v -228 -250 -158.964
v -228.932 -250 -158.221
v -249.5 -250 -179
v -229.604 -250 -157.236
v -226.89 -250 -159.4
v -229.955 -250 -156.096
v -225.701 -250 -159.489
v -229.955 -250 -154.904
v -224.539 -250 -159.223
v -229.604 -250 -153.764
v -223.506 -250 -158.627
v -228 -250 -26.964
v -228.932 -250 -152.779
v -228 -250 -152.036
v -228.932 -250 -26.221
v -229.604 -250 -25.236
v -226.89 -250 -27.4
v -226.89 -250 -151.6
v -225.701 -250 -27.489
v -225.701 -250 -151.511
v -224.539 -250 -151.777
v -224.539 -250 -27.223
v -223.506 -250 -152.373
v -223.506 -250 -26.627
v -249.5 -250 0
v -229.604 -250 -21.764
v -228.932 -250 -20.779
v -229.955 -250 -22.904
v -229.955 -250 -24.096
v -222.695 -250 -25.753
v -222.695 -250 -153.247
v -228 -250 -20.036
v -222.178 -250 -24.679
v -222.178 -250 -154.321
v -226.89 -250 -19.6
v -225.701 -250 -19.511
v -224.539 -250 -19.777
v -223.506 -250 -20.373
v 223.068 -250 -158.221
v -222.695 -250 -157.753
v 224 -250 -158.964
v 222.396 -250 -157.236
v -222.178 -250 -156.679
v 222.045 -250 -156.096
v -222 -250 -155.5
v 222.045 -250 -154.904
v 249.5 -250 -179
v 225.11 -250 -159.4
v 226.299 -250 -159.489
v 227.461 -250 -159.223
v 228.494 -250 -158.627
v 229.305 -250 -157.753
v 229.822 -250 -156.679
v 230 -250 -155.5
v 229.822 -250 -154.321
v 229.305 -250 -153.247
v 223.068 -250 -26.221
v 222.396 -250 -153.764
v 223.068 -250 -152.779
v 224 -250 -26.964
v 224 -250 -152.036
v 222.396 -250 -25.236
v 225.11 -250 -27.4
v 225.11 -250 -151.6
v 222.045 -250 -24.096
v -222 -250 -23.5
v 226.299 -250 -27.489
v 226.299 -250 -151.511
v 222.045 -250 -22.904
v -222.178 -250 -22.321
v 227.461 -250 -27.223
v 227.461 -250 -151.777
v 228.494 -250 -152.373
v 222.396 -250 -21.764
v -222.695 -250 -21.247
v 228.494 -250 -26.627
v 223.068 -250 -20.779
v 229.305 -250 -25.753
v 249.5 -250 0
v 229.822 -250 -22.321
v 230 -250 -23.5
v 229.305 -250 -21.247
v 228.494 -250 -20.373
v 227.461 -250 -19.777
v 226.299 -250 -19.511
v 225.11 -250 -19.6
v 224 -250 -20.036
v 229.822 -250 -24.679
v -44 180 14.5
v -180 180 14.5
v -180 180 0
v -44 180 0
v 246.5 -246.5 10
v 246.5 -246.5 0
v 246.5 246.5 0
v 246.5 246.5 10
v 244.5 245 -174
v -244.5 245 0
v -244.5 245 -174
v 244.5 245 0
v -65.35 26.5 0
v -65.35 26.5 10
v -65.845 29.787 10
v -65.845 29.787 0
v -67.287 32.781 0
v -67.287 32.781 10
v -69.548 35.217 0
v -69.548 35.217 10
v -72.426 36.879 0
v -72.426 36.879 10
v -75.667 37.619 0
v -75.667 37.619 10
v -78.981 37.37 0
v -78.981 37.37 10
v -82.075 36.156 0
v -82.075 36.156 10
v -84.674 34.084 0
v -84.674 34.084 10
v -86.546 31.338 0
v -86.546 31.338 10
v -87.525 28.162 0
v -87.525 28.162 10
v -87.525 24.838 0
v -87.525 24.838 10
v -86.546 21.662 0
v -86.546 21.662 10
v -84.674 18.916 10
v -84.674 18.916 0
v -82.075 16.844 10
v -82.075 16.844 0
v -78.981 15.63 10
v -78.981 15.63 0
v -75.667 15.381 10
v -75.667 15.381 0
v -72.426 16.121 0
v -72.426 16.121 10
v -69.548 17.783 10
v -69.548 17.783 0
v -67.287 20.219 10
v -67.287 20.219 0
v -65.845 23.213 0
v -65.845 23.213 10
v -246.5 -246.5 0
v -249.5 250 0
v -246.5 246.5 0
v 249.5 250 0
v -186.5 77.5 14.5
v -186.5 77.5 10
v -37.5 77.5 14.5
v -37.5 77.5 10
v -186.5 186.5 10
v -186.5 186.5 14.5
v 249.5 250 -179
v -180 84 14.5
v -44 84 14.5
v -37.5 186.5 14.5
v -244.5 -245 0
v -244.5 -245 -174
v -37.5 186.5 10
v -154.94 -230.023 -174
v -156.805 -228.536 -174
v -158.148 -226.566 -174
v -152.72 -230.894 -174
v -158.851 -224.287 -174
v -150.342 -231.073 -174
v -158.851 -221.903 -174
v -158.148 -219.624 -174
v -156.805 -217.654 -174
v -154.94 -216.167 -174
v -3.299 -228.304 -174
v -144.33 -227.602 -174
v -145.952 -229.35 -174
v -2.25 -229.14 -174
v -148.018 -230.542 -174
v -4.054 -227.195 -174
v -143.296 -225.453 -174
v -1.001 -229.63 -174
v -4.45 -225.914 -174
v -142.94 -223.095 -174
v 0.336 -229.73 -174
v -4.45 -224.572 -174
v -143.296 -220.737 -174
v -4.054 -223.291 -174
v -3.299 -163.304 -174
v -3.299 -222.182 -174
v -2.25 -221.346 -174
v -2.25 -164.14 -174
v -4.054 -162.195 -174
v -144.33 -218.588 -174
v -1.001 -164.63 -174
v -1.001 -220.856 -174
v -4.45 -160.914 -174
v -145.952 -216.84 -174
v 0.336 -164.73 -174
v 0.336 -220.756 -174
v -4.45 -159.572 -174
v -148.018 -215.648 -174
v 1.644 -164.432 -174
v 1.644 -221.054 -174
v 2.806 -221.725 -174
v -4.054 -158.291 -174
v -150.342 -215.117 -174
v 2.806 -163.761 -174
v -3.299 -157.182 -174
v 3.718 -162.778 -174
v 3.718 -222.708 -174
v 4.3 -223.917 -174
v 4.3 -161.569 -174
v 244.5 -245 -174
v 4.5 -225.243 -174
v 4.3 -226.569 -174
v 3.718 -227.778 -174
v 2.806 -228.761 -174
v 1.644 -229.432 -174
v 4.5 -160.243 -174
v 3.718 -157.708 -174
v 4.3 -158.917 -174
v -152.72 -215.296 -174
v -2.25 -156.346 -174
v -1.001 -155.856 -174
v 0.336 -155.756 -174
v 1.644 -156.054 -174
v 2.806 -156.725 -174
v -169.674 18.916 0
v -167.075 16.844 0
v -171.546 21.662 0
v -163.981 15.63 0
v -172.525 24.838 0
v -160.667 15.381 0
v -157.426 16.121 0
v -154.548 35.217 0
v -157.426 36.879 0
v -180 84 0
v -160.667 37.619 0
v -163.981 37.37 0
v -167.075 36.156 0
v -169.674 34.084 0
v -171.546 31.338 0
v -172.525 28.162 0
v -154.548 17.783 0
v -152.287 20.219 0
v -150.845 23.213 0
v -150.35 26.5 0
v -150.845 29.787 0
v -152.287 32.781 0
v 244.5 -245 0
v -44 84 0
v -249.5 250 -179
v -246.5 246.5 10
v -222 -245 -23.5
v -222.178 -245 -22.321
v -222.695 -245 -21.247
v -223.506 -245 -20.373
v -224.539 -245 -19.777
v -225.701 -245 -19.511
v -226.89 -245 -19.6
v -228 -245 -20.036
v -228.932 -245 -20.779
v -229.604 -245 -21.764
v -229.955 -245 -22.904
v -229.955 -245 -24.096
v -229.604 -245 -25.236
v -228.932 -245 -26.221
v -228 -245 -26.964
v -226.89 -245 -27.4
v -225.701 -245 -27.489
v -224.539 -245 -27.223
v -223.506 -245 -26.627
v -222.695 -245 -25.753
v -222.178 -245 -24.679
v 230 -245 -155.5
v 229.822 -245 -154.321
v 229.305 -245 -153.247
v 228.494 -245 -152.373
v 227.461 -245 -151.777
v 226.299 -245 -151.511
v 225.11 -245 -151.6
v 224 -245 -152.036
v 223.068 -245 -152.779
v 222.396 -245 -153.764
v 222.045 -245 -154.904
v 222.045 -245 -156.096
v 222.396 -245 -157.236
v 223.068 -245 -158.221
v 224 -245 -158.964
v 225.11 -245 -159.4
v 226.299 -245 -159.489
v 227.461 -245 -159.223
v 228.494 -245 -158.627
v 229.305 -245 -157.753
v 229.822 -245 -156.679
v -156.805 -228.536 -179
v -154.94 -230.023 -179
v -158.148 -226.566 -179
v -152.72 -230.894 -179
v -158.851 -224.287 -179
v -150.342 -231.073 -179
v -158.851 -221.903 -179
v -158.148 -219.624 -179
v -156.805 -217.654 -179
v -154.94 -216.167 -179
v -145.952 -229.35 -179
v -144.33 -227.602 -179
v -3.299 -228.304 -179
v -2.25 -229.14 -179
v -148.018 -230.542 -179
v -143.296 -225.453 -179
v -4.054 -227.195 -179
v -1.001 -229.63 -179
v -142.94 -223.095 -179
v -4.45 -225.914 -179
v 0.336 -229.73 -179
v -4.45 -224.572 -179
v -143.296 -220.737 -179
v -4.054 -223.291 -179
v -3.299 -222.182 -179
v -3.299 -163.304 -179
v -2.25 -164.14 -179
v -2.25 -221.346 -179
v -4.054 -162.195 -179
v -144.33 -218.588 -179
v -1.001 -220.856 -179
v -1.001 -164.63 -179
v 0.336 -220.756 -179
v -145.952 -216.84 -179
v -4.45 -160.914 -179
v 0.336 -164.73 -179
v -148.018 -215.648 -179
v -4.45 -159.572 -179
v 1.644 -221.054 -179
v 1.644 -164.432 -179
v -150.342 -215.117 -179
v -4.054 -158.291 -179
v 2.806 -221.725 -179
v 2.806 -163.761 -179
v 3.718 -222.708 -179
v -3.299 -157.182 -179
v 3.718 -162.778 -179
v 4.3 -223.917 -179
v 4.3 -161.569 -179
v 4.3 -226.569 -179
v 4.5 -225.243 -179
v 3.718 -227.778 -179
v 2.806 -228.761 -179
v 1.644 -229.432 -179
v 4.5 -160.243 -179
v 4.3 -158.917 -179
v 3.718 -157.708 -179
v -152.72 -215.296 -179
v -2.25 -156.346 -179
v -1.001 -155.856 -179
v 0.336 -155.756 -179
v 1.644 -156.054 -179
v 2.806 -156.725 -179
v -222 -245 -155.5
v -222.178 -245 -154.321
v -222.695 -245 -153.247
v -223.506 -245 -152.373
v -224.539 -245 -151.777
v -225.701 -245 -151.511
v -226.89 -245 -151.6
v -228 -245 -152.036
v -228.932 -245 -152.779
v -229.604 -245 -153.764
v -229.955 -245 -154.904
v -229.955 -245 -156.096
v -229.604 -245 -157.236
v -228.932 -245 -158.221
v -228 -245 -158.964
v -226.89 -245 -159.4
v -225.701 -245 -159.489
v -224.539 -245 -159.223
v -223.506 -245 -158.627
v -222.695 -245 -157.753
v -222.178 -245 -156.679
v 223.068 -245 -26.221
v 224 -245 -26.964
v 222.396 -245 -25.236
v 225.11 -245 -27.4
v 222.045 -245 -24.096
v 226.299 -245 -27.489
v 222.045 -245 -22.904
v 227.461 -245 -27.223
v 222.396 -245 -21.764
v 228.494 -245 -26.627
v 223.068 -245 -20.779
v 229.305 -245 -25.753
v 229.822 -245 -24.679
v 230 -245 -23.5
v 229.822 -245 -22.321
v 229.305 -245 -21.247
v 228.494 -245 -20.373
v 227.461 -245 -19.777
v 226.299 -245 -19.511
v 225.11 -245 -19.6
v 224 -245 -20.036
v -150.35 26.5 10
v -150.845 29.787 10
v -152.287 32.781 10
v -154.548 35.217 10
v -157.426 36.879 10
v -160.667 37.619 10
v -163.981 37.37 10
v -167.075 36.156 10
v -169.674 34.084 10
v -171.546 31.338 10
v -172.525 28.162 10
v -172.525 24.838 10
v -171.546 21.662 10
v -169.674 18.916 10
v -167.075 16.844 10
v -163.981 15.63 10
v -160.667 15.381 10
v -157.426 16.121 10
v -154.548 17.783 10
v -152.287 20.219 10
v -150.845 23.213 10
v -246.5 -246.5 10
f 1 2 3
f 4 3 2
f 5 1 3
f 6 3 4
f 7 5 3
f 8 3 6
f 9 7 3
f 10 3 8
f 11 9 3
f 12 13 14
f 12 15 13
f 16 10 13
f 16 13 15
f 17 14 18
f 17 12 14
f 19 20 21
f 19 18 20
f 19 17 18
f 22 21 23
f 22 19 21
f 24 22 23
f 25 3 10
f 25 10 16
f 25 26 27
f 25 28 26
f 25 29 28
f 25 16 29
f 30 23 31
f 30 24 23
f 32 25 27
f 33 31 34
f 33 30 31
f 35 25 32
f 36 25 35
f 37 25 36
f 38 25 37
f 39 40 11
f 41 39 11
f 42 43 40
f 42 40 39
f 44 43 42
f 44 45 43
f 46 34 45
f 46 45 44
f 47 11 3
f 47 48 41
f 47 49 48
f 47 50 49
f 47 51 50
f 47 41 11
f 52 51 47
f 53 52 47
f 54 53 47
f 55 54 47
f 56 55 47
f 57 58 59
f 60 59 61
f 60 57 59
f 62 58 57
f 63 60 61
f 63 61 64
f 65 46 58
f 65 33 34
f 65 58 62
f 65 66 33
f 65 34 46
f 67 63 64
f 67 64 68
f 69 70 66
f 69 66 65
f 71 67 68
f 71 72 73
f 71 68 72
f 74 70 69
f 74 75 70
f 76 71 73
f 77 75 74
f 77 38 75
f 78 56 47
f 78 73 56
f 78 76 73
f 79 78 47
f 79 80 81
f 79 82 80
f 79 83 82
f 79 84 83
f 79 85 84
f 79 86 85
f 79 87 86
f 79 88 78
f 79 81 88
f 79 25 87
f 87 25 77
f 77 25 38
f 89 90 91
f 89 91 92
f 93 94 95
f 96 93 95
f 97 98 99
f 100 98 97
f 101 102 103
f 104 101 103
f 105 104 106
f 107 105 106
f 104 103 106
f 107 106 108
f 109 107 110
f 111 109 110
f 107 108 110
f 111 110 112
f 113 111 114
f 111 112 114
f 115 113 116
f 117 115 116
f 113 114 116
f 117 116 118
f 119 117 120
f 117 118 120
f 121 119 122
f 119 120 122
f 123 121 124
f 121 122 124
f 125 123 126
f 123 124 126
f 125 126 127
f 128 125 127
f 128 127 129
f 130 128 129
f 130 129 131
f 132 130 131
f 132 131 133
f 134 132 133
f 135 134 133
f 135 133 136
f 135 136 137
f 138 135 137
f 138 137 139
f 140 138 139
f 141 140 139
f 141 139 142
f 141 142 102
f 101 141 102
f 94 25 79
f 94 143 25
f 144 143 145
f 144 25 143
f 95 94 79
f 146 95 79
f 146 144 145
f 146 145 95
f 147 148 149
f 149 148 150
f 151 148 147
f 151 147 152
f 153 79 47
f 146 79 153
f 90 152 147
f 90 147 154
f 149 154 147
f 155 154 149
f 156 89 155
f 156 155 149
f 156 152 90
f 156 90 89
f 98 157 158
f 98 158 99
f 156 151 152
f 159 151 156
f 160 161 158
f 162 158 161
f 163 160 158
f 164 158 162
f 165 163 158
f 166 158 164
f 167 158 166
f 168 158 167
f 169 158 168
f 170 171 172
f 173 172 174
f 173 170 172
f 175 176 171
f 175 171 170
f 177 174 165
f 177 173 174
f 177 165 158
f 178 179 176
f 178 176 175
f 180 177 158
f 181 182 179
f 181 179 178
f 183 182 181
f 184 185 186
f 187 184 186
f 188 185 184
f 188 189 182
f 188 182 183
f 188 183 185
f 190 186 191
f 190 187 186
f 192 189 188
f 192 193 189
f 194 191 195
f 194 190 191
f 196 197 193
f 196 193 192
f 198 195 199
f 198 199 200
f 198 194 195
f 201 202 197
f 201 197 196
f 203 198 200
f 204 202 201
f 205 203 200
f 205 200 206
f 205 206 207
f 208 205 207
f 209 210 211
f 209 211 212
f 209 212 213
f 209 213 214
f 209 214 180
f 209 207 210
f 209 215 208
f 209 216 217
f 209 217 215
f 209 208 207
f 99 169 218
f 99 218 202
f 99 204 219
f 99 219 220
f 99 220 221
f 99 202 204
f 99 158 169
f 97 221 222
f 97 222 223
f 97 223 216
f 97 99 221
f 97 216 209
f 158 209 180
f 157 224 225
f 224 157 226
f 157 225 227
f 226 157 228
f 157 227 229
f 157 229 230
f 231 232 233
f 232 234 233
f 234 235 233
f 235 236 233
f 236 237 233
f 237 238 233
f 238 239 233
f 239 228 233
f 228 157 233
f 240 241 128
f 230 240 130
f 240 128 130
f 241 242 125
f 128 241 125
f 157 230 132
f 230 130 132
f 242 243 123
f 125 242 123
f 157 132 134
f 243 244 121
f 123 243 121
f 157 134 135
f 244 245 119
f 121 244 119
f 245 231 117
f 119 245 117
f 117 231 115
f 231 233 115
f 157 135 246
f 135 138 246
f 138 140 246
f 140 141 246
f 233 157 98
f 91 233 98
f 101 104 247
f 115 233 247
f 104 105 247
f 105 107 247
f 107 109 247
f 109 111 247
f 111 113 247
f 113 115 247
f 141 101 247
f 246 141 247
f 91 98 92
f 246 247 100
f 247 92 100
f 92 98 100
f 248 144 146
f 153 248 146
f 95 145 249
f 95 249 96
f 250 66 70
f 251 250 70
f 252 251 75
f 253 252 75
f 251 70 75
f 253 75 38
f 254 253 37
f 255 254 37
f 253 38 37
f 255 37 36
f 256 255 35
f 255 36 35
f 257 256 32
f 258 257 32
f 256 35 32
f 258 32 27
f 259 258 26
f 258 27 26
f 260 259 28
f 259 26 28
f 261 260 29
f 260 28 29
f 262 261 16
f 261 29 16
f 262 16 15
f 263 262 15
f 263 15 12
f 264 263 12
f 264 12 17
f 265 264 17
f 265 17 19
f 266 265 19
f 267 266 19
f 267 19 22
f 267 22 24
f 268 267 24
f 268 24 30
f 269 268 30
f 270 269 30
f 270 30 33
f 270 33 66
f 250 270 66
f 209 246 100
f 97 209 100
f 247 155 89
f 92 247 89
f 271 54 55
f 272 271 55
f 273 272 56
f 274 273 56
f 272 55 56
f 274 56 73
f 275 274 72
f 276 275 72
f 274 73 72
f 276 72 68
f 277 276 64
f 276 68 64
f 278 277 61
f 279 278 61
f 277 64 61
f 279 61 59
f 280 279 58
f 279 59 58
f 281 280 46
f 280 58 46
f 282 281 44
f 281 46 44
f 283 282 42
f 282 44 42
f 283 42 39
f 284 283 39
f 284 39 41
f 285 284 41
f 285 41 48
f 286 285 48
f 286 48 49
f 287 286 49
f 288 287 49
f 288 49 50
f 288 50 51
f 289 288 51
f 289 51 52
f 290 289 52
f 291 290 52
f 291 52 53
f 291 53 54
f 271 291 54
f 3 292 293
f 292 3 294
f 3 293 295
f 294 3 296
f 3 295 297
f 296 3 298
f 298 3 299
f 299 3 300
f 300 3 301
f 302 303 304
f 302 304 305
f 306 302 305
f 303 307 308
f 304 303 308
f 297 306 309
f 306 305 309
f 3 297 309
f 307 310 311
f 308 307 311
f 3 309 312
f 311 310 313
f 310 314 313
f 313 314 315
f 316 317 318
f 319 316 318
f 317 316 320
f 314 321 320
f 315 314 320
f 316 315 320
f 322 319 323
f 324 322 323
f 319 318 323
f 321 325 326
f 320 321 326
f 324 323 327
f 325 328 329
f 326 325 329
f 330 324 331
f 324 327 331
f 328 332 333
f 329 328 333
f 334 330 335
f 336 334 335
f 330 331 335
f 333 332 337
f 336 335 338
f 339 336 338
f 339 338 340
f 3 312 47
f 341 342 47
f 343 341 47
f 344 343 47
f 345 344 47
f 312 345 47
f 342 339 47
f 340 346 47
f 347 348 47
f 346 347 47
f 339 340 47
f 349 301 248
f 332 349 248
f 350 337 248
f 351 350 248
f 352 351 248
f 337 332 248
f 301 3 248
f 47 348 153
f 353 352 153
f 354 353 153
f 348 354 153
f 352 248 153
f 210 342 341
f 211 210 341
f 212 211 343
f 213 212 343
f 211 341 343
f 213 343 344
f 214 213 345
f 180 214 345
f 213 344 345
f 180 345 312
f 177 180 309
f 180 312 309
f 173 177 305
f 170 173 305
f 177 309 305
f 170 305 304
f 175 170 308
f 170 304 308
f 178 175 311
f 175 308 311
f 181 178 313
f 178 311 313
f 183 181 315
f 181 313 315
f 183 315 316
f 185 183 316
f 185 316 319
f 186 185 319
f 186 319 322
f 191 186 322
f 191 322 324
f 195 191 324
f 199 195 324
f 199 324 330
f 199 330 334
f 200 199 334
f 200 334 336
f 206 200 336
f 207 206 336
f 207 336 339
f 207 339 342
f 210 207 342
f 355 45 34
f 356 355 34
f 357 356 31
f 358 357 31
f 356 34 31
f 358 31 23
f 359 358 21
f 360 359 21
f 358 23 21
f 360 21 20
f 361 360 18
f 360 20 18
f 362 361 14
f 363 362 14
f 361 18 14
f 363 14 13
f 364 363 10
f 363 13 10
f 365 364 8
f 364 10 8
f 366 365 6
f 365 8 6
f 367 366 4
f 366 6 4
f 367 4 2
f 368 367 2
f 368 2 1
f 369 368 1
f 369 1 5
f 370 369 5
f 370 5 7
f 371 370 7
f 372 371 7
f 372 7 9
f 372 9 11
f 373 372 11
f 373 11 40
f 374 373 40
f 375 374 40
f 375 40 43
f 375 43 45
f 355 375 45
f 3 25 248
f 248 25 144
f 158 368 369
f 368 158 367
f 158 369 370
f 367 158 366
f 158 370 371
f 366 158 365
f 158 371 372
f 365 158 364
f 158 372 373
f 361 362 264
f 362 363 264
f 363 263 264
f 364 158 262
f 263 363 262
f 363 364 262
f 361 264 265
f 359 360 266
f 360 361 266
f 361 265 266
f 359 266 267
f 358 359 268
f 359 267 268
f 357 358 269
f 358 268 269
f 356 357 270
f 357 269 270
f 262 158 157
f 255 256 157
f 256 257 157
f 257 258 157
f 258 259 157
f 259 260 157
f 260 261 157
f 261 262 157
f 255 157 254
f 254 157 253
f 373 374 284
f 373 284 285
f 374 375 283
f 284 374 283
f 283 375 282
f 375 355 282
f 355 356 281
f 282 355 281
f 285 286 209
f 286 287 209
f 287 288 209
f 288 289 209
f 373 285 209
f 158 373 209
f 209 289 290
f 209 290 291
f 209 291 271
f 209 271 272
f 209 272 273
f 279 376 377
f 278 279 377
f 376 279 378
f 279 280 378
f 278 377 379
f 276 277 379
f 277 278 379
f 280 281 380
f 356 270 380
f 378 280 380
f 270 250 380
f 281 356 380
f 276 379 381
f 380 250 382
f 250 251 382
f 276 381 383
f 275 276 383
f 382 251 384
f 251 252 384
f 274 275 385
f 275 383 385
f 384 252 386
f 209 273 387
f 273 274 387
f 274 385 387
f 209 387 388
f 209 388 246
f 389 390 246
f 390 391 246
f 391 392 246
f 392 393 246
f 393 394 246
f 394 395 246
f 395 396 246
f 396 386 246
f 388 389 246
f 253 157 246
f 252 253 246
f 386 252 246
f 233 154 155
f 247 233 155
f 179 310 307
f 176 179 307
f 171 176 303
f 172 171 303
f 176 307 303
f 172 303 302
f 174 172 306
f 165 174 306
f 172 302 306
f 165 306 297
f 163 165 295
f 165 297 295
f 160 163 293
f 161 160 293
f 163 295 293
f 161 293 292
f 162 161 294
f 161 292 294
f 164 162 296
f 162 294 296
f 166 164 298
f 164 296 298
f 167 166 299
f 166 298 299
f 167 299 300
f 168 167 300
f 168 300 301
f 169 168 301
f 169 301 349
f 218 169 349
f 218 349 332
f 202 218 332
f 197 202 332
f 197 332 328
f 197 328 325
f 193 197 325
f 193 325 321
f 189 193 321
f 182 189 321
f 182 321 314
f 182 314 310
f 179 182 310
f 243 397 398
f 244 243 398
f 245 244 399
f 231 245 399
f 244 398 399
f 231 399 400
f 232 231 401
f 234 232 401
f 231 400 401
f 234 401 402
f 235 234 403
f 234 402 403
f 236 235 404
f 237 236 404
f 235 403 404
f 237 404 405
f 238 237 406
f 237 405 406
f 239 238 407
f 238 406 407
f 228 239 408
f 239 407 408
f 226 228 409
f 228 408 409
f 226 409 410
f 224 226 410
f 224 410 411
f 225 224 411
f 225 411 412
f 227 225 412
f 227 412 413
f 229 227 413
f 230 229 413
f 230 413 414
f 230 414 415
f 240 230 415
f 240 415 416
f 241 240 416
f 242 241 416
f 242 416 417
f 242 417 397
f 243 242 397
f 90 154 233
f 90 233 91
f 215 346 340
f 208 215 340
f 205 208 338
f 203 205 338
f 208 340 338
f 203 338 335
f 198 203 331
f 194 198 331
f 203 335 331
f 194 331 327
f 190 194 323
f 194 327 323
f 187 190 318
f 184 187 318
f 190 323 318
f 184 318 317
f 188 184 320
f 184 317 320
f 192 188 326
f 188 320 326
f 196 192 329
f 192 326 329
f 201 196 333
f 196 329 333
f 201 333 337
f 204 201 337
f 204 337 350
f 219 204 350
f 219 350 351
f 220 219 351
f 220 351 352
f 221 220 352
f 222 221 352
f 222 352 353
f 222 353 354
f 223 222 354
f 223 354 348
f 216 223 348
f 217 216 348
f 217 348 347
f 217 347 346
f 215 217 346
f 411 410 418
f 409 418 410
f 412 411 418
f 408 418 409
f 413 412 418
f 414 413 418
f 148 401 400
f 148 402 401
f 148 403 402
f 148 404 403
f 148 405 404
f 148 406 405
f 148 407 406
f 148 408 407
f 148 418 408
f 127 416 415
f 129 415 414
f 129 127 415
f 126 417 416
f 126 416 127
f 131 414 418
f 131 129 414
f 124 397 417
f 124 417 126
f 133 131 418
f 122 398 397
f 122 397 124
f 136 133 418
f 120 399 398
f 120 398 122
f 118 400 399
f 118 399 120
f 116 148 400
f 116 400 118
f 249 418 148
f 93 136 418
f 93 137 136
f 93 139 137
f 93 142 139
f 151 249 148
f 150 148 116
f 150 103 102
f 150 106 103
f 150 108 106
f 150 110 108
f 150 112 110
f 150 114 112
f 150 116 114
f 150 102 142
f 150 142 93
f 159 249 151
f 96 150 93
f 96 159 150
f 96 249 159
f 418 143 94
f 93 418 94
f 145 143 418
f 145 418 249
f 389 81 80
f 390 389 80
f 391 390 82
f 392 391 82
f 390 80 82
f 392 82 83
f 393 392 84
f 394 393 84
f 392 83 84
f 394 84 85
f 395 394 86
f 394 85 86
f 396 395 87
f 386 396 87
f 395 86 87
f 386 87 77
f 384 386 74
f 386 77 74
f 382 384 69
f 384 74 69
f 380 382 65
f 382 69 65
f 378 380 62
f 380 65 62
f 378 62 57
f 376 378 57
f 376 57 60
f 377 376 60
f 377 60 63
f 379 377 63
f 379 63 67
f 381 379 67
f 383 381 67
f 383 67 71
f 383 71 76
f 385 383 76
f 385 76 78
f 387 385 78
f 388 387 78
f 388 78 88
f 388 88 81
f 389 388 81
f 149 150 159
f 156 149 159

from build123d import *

# Parameters (mm, degrees)
F0_W      = 499
F0_H      = 500
F1_DEPTH  = 179
F2_T      = -5
F3_W      = 493
F3_H      = 493
F4_DEPTH  = 10
F5_W      = 149
F5_H      = 109
F6_DEPTH  = 4.5
F7_W      = 136
F7_H      = 96
F8_DEPTH  = 60.5
F9_R      = 11.15
F10_DEPTH = 25
F11_R     = 8
F11_R_2   = 4.5
F12_DEPTH = 25
F13_R     = 4
F14_DEPTH = 10


with BuildPart() as f1:
    # F0 (on Top) → F1 (new body)
    with BuildSketch(Plane.XY):
        Rectangle(F0_W, F0_H)
    extrude(amount=-F1_DEPTH)

    # F2
    f2_openings = [f1.faces().sort_by_distance(p)[0] for p in [
        (0, 0, 0),
    ]]
    offset(amount=F2_T, openings=f2_openings)

    # F3 (on Top) → F4 (join)
    with BuildSketch(Plane.XY):
        Rectangle(F3_W, F3_H)
    extrude(amount=F4_DEPTH)

    # F5 (on face) → F6 (join)
    with BuildSketch(Plane.XY.offset(10)):
        with Locations((-112, 132)):
            Rectangle(F5_W, F5_H)
    extrude(amount=F6_DEPTH)

    # F7 (on face) → F8 (cut)
    with BuildSketch(Plane.XY.offset(14.5)):
        with Locations((-112, 132)):
            Rectangle(F7_W, F7_H)
    extrude(amount=-F8_DEPTH, mode=Mode.SUBTRACT)

    # F9 (on face) → F10 (cut)
    with BuildSketch(Plane.XY.offset(10)):
        with Locations((-76.5, 26.5)):
            Circle(F9_R)
        with Locations((-161.5, 26.5)):
            Circle(F9_R)
    extrude(amount=-F10_DEPTH, mode=Mode.SUBTRACT)

    # F11 (on face) → F12 (cut)
    with BuildSketch(Plane(origin=(0, 0, -179), x_dir=(1, 0, 0), z_dir=(0, 0, -1))):
        with Locations((-150.940314, 223.095)):
            Circle(F11_R)
        with Locations((0, 160.243019)):
            Circle(F11_R_2)
        with Locations((0, 225.243019)):
            Circle(F11_R_2)
    extrude(amount=-F12_DEPTH, mode=Mode.SUBTRACT)

    # F13 (on face) → F14 (cut)
    with BuildSketch(Plane.XZ.offset(250)):
        with Locations((-226, -23.5)):
            Circle(F13_R)
        with Locations((-226, -155.5)):
            Circle(F13_R)
        with Locations((226, -155.5)):
            Circle(F13_R)
        with Locations((226, -23.5)):
            Circle(F13_R)
    extrude(amount=-F14_DEPTH, mode=Mode.SUBTRACT)


solid = f1.part
